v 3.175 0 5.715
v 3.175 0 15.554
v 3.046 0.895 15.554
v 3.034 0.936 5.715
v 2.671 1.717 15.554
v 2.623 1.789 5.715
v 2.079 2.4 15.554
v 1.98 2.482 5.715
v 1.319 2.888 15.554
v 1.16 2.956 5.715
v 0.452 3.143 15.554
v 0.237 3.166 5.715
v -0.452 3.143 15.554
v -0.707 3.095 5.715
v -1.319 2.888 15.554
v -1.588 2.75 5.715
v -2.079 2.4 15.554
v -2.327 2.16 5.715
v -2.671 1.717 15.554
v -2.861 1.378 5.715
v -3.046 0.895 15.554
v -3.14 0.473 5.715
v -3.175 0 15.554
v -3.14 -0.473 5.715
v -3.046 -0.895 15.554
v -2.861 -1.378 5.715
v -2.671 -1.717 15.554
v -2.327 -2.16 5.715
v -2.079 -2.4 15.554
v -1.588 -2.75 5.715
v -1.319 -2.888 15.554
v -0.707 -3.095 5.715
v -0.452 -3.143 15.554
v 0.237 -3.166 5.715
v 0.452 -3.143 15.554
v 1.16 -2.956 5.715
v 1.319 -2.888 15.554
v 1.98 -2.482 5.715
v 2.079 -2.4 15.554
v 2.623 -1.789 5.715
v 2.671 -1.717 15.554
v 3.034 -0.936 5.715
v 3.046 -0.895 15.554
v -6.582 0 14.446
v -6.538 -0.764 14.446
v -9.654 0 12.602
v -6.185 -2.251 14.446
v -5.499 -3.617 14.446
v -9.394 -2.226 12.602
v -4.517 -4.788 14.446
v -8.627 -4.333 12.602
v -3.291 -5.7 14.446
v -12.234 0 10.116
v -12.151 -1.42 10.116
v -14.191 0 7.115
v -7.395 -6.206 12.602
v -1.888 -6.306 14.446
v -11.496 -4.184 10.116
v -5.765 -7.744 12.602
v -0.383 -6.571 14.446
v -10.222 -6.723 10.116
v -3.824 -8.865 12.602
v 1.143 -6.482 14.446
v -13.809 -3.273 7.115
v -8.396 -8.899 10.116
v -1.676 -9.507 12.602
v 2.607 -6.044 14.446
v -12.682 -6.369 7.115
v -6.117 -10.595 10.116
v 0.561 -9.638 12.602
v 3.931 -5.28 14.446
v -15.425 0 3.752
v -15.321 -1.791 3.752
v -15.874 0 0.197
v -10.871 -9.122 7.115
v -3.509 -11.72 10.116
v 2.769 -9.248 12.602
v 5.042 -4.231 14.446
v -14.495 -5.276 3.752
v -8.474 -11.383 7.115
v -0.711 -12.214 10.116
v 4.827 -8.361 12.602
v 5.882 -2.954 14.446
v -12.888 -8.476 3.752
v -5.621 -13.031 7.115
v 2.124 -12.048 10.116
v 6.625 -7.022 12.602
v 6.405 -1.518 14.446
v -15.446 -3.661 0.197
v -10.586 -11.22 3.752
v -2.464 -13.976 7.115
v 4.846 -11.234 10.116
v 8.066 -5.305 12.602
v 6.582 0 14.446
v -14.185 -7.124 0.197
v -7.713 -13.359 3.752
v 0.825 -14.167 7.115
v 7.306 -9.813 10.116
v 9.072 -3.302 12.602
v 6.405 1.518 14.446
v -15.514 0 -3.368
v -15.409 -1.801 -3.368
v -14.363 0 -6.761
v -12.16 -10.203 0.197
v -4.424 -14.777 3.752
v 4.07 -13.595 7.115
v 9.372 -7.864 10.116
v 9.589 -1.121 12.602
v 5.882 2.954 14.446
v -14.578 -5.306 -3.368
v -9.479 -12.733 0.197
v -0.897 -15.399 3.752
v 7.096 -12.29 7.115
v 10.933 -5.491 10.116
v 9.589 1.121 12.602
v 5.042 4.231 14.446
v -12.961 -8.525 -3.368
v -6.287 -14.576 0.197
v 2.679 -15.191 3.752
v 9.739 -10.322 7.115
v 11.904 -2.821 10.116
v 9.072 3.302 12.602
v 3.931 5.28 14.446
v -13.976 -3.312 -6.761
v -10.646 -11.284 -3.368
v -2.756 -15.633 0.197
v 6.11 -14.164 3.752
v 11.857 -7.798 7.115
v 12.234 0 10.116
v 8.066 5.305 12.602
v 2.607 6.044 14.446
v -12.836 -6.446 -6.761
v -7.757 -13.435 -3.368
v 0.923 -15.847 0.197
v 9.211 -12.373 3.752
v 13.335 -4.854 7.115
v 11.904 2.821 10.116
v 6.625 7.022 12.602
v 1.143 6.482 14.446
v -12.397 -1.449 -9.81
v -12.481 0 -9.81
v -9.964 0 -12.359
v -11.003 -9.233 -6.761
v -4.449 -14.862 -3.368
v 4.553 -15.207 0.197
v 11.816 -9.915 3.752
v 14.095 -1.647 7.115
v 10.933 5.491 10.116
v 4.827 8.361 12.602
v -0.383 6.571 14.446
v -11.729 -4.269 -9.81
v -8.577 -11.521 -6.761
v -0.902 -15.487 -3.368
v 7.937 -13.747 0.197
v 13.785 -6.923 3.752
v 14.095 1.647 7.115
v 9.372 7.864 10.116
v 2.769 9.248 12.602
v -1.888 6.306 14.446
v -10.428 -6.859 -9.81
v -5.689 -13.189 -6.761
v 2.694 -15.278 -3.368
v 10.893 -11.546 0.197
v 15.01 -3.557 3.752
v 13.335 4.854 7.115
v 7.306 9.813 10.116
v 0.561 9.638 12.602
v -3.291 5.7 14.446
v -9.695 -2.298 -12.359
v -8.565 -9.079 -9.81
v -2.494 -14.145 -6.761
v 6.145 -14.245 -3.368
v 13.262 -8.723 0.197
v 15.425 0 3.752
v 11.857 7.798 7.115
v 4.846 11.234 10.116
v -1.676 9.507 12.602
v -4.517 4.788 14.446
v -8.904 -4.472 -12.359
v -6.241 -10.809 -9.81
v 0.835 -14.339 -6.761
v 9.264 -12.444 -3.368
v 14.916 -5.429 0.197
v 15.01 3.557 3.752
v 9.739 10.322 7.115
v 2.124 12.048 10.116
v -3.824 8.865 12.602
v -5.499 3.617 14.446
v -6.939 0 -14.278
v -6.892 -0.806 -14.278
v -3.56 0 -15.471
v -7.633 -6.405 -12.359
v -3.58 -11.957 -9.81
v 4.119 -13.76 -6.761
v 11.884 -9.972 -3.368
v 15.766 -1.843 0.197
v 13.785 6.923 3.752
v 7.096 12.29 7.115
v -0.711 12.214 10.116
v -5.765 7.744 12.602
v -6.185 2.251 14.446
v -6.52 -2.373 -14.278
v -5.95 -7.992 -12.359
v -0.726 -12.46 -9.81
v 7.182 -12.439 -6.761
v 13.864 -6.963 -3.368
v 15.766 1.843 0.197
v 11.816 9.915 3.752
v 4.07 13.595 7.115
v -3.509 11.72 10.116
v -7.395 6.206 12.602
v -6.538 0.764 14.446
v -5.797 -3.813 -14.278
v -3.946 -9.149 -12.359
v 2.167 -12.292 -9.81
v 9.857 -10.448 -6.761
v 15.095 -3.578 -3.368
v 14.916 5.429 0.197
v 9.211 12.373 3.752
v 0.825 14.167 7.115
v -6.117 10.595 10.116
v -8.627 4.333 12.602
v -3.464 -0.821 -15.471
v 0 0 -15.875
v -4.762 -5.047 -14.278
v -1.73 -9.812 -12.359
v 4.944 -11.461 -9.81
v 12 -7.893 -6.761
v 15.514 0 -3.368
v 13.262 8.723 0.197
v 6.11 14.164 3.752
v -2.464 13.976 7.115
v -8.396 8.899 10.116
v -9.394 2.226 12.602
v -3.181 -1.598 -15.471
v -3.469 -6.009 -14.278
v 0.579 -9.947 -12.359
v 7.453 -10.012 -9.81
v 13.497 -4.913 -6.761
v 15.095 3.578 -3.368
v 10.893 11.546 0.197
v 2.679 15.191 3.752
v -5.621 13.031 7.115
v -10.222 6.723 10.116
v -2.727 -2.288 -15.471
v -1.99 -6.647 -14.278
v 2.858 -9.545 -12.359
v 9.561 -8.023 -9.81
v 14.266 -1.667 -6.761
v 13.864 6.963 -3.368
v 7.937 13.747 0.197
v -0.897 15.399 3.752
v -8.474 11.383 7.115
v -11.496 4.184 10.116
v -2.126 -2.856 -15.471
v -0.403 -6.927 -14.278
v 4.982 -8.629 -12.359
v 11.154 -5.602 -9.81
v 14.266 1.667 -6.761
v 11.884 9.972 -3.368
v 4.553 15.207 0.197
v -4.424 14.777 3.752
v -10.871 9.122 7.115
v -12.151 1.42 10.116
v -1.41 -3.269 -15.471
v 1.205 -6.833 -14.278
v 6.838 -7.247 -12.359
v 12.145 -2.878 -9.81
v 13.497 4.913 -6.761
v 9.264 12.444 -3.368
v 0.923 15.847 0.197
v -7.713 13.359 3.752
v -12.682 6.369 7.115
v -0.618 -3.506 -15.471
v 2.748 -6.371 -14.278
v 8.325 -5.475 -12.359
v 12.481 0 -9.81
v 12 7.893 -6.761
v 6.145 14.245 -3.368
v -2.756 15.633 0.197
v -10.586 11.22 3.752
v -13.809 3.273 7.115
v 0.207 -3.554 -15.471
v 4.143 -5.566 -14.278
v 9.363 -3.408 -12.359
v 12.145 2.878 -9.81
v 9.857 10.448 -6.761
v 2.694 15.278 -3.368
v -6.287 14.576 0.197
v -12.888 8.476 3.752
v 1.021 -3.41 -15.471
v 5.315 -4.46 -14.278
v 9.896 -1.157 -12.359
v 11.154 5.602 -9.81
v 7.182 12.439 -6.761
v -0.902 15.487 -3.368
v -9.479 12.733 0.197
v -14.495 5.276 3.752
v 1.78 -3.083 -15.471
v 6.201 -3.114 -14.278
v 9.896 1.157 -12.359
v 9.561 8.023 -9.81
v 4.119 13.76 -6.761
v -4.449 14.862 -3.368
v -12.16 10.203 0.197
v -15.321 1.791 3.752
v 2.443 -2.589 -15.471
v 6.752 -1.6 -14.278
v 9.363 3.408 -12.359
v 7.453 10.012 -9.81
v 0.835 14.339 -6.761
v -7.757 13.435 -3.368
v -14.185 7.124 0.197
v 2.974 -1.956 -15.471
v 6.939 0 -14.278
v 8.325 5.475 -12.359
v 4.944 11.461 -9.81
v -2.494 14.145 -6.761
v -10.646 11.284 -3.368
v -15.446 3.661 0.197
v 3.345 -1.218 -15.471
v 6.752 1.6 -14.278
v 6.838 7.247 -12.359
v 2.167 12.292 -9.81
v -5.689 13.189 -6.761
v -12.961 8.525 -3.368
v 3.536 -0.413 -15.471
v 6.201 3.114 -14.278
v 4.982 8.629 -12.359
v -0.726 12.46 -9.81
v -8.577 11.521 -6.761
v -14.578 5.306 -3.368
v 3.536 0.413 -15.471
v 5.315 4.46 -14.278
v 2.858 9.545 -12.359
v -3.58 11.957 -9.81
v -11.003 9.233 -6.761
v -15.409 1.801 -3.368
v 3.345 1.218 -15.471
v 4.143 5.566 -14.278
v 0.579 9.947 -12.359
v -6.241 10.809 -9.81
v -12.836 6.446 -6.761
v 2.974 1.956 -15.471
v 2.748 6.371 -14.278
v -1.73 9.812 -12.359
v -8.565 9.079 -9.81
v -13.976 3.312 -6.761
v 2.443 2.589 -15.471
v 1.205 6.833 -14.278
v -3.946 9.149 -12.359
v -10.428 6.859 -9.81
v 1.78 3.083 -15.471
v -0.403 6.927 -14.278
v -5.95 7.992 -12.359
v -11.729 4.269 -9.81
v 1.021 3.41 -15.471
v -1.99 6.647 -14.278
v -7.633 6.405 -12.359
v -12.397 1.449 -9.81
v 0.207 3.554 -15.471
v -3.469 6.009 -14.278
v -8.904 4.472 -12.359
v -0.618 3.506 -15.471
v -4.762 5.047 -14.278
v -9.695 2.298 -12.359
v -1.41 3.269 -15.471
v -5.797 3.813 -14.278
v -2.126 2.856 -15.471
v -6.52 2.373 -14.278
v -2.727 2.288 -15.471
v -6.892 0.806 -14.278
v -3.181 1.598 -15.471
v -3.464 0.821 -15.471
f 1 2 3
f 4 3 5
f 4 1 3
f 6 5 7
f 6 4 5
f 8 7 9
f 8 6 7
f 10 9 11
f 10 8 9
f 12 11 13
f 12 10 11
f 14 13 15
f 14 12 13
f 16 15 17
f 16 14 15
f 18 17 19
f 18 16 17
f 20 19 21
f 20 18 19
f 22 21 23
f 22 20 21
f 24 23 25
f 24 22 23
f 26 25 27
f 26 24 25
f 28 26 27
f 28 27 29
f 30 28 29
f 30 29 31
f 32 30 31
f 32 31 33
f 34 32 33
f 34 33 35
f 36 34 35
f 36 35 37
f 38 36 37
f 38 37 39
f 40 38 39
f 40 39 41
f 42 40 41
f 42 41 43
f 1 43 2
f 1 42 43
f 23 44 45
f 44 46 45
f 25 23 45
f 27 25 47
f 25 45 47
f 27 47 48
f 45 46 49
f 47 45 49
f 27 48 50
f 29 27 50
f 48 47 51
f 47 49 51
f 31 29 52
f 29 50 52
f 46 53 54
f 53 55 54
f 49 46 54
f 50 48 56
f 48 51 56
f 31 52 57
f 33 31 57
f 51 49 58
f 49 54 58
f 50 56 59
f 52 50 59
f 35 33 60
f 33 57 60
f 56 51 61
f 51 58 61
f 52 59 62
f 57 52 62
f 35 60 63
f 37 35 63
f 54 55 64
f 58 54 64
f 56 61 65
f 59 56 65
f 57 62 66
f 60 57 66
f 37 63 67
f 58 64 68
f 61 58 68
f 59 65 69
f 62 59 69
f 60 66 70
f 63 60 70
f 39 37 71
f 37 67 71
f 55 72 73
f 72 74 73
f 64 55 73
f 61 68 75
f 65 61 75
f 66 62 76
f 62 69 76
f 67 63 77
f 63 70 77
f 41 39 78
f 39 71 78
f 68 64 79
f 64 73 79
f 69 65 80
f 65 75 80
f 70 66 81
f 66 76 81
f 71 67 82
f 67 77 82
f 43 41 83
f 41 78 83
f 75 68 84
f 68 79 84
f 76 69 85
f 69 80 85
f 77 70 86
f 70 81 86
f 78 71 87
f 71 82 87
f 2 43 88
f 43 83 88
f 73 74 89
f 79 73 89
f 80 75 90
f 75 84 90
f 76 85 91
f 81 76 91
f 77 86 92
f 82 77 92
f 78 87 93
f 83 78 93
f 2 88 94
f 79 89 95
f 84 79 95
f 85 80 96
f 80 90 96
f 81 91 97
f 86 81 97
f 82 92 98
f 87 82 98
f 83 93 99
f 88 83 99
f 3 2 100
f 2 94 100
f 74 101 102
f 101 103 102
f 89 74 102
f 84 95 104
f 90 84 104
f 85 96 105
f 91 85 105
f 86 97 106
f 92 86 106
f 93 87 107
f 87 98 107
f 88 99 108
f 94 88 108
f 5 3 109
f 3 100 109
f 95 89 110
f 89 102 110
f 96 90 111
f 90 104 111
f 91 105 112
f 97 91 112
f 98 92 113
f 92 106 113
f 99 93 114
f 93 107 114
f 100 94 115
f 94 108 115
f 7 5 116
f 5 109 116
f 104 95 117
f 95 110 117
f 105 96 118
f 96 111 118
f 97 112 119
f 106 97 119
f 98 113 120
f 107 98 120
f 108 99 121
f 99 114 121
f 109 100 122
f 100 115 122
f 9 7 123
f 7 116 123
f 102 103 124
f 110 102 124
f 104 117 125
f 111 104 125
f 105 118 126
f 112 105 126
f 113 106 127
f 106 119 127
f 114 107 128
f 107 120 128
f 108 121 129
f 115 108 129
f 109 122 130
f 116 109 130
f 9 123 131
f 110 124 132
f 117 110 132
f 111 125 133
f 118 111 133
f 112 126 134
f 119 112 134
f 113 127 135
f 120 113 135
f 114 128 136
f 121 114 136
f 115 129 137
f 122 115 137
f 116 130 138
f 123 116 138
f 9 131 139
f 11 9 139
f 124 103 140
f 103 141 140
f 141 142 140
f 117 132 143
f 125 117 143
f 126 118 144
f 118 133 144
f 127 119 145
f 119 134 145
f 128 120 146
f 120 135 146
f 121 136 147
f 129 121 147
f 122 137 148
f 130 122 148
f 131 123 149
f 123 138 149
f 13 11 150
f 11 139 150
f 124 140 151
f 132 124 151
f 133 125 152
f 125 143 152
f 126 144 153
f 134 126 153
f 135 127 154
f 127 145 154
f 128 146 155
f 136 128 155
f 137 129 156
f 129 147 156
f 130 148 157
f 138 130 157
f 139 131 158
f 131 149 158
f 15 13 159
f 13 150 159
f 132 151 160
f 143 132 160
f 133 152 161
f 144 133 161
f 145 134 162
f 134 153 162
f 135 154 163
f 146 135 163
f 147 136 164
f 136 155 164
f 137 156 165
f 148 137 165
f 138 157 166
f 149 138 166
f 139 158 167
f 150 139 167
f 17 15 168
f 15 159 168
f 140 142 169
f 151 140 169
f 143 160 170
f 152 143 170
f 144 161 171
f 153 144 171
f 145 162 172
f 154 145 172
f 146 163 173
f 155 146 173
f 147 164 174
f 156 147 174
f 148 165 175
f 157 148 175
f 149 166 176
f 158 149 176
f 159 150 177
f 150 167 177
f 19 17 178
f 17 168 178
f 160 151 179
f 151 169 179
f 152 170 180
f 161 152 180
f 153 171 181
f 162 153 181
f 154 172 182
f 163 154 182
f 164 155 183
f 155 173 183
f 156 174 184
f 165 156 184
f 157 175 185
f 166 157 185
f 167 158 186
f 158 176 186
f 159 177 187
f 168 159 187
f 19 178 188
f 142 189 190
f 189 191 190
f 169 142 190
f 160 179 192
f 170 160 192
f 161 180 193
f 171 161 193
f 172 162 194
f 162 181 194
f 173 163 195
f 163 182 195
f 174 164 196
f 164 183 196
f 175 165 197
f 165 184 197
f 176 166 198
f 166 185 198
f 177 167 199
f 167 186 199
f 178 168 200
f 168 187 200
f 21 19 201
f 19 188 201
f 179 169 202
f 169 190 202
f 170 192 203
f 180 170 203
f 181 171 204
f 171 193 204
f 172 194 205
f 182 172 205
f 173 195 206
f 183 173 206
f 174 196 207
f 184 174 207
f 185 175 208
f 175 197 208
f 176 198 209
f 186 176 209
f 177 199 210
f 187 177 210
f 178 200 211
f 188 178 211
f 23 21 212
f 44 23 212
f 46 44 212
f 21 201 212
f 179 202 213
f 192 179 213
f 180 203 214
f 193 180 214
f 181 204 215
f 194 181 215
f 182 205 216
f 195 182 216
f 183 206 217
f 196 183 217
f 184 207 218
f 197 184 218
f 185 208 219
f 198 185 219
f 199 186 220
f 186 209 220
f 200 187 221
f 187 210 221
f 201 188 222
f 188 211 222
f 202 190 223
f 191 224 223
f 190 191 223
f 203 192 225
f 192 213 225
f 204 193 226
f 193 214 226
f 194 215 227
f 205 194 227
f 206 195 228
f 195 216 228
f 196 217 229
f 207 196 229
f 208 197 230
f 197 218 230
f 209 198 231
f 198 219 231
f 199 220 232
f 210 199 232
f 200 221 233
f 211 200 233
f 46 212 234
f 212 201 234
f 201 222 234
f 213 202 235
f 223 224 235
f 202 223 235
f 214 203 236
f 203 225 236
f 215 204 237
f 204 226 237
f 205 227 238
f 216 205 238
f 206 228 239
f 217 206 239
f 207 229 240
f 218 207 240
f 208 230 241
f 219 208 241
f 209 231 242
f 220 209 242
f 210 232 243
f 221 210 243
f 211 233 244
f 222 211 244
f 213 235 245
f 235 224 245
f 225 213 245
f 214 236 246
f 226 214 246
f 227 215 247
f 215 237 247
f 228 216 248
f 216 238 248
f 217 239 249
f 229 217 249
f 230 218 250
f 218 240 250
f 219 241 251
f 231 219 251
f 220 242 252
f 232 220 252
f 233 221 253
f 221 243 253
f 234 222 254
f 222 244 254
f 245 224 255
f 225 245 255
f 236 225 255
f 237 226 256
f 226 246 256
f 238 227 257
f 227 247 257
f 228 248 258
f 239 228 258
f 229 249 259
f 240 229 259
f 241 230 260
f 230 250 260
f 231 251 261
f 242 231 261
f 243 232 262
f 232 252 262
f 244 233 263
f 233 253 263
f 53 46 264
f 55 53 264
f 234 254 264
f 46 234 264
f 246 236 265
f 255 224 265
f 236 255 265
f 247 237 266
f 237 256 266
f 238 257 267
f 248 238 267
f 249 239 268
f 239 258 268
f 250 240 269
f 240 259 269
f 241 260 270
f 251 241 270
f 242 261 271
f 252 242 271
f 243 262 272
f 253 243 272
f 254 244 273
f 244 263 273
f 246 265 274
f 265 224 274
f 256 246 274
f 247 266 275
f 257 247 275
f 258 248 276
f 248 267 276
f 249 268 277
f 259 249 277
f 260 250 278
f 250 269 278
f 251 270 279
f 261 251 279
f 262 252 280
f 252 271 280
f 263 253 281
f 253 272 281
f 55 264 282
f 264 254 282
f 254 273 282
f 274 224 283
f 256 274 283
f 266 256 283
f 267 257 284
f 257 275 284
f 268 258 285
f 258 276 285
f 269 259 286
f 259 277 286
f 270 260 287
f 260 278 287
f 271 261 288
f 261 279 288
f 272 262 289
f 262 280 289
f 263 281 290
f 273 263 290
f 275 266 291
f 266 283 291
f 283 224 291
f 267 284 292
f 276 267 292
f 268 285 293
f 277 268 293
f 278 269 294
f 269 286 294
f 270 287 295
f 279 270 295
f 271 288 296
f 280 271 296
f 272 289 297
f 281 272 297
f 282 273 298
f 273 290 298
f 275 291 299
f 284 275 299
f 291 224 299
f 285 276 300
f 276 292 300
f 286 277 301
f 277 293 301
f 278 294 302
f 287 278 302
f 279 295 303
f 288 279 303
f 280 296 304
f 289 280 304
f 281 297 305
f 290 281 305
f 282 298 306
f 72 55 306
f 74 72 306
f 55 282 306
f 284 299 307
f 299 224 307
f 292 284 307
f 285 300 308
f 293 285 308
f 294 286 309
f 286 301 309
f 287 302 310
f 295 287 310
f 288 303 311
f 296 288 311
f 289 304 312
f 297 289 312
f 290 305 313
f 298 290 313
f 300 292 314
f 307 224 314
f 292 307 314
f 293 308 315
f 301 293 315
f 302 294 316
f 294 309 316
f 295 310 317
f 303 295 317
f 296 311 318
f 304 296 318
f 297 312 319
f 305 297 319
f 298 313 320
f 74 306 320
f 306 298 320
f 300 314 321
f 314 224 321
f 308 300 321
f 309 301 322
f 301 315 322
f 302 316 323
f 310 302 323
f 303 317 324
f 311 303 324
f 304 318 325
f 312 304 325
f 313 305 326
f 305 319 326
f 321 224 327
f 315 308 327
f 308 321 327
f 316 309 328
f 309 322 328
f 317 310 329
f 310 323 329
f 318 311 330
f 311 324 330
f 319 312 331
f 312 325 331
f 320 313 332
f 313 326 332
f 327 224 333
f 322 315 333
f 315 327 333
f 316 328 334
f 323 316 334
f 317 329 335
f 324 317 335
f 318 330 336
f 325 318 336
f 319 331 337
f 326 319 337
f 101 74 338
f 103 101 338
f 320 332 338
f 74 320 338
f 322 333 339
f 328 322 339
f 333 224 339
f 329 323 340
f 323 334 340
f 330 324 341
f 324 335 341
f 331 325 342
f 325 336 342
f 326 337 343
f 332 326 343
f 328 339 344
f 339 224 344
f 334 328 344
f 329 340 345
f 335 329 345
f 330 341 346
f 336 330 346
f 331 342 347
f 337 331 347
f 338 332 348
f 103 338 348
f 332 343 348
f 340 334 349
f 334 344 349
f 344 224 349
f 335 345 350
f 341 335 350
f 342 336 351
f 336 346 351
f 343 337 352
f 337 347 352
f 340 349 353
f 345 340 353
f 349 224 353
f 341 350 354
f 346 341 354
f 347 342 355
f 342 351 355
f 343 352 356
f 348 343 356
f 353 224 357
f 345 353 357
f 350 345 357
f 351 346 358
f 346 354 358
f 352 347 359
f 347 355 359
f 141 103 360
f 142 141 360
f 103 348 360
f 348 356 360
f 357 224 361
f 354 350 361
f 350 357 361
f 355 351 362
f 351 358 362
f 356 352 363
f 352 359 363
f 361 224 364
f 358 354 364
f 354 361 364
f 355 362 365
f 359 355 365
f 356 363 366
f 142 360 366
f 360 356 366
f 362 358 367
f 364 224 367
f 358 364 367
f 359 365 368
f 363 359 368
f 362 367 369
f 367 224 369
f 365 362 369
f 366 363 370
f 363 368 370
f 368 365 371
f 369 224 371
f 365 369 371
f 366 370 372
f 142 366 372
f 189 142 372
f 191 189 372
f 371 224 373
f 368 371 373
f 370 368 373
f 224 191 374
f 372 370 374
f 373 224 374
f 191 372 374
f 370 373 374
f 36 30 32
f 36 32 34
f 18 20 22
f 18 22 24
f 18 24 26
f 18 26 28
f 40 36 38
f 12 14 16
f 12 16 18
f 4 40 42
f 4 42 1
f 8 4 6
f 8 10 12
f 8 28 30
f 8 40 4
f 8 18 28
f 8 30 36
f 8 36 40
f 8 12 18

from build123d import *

# Parameters (mm, degrees)
F5_R     = 3.175
F6_DEPTH = 50.8


# Not quite as in the source:
# - a length typed as a fraction of an inch, garbled in the dataset ("3 / 203.2 mm" for 3/8 in), is restored


with BuildPart() as f2:
    # F0 (on Front) → F2 (revolve)
    with BuildSketch(Plane.XZ):
        with BuildLine():
            Line((0, -15.875), (0, 15.875))
            ThreePointArc((0, 15.875), (-15.875, 0), (0, -15.875))
        make_face()
    revolve(axis=Axis((0, 0, 0), (0, 0, 1)))


with BuildPart() as f6:
    # F5 (on offset) → F6 (new body)
    with BuildSketch(Plane.XY.offset(5.715)):
        Circle(F5_R)
    extrude(amount=F6_DEPTH)


with BuildPart() as f2_1:
    add(f2.part)

    # F7: cut F6
    add(f6.part, mode=Mode.SUBTRACT)


solid = f2_1.part
